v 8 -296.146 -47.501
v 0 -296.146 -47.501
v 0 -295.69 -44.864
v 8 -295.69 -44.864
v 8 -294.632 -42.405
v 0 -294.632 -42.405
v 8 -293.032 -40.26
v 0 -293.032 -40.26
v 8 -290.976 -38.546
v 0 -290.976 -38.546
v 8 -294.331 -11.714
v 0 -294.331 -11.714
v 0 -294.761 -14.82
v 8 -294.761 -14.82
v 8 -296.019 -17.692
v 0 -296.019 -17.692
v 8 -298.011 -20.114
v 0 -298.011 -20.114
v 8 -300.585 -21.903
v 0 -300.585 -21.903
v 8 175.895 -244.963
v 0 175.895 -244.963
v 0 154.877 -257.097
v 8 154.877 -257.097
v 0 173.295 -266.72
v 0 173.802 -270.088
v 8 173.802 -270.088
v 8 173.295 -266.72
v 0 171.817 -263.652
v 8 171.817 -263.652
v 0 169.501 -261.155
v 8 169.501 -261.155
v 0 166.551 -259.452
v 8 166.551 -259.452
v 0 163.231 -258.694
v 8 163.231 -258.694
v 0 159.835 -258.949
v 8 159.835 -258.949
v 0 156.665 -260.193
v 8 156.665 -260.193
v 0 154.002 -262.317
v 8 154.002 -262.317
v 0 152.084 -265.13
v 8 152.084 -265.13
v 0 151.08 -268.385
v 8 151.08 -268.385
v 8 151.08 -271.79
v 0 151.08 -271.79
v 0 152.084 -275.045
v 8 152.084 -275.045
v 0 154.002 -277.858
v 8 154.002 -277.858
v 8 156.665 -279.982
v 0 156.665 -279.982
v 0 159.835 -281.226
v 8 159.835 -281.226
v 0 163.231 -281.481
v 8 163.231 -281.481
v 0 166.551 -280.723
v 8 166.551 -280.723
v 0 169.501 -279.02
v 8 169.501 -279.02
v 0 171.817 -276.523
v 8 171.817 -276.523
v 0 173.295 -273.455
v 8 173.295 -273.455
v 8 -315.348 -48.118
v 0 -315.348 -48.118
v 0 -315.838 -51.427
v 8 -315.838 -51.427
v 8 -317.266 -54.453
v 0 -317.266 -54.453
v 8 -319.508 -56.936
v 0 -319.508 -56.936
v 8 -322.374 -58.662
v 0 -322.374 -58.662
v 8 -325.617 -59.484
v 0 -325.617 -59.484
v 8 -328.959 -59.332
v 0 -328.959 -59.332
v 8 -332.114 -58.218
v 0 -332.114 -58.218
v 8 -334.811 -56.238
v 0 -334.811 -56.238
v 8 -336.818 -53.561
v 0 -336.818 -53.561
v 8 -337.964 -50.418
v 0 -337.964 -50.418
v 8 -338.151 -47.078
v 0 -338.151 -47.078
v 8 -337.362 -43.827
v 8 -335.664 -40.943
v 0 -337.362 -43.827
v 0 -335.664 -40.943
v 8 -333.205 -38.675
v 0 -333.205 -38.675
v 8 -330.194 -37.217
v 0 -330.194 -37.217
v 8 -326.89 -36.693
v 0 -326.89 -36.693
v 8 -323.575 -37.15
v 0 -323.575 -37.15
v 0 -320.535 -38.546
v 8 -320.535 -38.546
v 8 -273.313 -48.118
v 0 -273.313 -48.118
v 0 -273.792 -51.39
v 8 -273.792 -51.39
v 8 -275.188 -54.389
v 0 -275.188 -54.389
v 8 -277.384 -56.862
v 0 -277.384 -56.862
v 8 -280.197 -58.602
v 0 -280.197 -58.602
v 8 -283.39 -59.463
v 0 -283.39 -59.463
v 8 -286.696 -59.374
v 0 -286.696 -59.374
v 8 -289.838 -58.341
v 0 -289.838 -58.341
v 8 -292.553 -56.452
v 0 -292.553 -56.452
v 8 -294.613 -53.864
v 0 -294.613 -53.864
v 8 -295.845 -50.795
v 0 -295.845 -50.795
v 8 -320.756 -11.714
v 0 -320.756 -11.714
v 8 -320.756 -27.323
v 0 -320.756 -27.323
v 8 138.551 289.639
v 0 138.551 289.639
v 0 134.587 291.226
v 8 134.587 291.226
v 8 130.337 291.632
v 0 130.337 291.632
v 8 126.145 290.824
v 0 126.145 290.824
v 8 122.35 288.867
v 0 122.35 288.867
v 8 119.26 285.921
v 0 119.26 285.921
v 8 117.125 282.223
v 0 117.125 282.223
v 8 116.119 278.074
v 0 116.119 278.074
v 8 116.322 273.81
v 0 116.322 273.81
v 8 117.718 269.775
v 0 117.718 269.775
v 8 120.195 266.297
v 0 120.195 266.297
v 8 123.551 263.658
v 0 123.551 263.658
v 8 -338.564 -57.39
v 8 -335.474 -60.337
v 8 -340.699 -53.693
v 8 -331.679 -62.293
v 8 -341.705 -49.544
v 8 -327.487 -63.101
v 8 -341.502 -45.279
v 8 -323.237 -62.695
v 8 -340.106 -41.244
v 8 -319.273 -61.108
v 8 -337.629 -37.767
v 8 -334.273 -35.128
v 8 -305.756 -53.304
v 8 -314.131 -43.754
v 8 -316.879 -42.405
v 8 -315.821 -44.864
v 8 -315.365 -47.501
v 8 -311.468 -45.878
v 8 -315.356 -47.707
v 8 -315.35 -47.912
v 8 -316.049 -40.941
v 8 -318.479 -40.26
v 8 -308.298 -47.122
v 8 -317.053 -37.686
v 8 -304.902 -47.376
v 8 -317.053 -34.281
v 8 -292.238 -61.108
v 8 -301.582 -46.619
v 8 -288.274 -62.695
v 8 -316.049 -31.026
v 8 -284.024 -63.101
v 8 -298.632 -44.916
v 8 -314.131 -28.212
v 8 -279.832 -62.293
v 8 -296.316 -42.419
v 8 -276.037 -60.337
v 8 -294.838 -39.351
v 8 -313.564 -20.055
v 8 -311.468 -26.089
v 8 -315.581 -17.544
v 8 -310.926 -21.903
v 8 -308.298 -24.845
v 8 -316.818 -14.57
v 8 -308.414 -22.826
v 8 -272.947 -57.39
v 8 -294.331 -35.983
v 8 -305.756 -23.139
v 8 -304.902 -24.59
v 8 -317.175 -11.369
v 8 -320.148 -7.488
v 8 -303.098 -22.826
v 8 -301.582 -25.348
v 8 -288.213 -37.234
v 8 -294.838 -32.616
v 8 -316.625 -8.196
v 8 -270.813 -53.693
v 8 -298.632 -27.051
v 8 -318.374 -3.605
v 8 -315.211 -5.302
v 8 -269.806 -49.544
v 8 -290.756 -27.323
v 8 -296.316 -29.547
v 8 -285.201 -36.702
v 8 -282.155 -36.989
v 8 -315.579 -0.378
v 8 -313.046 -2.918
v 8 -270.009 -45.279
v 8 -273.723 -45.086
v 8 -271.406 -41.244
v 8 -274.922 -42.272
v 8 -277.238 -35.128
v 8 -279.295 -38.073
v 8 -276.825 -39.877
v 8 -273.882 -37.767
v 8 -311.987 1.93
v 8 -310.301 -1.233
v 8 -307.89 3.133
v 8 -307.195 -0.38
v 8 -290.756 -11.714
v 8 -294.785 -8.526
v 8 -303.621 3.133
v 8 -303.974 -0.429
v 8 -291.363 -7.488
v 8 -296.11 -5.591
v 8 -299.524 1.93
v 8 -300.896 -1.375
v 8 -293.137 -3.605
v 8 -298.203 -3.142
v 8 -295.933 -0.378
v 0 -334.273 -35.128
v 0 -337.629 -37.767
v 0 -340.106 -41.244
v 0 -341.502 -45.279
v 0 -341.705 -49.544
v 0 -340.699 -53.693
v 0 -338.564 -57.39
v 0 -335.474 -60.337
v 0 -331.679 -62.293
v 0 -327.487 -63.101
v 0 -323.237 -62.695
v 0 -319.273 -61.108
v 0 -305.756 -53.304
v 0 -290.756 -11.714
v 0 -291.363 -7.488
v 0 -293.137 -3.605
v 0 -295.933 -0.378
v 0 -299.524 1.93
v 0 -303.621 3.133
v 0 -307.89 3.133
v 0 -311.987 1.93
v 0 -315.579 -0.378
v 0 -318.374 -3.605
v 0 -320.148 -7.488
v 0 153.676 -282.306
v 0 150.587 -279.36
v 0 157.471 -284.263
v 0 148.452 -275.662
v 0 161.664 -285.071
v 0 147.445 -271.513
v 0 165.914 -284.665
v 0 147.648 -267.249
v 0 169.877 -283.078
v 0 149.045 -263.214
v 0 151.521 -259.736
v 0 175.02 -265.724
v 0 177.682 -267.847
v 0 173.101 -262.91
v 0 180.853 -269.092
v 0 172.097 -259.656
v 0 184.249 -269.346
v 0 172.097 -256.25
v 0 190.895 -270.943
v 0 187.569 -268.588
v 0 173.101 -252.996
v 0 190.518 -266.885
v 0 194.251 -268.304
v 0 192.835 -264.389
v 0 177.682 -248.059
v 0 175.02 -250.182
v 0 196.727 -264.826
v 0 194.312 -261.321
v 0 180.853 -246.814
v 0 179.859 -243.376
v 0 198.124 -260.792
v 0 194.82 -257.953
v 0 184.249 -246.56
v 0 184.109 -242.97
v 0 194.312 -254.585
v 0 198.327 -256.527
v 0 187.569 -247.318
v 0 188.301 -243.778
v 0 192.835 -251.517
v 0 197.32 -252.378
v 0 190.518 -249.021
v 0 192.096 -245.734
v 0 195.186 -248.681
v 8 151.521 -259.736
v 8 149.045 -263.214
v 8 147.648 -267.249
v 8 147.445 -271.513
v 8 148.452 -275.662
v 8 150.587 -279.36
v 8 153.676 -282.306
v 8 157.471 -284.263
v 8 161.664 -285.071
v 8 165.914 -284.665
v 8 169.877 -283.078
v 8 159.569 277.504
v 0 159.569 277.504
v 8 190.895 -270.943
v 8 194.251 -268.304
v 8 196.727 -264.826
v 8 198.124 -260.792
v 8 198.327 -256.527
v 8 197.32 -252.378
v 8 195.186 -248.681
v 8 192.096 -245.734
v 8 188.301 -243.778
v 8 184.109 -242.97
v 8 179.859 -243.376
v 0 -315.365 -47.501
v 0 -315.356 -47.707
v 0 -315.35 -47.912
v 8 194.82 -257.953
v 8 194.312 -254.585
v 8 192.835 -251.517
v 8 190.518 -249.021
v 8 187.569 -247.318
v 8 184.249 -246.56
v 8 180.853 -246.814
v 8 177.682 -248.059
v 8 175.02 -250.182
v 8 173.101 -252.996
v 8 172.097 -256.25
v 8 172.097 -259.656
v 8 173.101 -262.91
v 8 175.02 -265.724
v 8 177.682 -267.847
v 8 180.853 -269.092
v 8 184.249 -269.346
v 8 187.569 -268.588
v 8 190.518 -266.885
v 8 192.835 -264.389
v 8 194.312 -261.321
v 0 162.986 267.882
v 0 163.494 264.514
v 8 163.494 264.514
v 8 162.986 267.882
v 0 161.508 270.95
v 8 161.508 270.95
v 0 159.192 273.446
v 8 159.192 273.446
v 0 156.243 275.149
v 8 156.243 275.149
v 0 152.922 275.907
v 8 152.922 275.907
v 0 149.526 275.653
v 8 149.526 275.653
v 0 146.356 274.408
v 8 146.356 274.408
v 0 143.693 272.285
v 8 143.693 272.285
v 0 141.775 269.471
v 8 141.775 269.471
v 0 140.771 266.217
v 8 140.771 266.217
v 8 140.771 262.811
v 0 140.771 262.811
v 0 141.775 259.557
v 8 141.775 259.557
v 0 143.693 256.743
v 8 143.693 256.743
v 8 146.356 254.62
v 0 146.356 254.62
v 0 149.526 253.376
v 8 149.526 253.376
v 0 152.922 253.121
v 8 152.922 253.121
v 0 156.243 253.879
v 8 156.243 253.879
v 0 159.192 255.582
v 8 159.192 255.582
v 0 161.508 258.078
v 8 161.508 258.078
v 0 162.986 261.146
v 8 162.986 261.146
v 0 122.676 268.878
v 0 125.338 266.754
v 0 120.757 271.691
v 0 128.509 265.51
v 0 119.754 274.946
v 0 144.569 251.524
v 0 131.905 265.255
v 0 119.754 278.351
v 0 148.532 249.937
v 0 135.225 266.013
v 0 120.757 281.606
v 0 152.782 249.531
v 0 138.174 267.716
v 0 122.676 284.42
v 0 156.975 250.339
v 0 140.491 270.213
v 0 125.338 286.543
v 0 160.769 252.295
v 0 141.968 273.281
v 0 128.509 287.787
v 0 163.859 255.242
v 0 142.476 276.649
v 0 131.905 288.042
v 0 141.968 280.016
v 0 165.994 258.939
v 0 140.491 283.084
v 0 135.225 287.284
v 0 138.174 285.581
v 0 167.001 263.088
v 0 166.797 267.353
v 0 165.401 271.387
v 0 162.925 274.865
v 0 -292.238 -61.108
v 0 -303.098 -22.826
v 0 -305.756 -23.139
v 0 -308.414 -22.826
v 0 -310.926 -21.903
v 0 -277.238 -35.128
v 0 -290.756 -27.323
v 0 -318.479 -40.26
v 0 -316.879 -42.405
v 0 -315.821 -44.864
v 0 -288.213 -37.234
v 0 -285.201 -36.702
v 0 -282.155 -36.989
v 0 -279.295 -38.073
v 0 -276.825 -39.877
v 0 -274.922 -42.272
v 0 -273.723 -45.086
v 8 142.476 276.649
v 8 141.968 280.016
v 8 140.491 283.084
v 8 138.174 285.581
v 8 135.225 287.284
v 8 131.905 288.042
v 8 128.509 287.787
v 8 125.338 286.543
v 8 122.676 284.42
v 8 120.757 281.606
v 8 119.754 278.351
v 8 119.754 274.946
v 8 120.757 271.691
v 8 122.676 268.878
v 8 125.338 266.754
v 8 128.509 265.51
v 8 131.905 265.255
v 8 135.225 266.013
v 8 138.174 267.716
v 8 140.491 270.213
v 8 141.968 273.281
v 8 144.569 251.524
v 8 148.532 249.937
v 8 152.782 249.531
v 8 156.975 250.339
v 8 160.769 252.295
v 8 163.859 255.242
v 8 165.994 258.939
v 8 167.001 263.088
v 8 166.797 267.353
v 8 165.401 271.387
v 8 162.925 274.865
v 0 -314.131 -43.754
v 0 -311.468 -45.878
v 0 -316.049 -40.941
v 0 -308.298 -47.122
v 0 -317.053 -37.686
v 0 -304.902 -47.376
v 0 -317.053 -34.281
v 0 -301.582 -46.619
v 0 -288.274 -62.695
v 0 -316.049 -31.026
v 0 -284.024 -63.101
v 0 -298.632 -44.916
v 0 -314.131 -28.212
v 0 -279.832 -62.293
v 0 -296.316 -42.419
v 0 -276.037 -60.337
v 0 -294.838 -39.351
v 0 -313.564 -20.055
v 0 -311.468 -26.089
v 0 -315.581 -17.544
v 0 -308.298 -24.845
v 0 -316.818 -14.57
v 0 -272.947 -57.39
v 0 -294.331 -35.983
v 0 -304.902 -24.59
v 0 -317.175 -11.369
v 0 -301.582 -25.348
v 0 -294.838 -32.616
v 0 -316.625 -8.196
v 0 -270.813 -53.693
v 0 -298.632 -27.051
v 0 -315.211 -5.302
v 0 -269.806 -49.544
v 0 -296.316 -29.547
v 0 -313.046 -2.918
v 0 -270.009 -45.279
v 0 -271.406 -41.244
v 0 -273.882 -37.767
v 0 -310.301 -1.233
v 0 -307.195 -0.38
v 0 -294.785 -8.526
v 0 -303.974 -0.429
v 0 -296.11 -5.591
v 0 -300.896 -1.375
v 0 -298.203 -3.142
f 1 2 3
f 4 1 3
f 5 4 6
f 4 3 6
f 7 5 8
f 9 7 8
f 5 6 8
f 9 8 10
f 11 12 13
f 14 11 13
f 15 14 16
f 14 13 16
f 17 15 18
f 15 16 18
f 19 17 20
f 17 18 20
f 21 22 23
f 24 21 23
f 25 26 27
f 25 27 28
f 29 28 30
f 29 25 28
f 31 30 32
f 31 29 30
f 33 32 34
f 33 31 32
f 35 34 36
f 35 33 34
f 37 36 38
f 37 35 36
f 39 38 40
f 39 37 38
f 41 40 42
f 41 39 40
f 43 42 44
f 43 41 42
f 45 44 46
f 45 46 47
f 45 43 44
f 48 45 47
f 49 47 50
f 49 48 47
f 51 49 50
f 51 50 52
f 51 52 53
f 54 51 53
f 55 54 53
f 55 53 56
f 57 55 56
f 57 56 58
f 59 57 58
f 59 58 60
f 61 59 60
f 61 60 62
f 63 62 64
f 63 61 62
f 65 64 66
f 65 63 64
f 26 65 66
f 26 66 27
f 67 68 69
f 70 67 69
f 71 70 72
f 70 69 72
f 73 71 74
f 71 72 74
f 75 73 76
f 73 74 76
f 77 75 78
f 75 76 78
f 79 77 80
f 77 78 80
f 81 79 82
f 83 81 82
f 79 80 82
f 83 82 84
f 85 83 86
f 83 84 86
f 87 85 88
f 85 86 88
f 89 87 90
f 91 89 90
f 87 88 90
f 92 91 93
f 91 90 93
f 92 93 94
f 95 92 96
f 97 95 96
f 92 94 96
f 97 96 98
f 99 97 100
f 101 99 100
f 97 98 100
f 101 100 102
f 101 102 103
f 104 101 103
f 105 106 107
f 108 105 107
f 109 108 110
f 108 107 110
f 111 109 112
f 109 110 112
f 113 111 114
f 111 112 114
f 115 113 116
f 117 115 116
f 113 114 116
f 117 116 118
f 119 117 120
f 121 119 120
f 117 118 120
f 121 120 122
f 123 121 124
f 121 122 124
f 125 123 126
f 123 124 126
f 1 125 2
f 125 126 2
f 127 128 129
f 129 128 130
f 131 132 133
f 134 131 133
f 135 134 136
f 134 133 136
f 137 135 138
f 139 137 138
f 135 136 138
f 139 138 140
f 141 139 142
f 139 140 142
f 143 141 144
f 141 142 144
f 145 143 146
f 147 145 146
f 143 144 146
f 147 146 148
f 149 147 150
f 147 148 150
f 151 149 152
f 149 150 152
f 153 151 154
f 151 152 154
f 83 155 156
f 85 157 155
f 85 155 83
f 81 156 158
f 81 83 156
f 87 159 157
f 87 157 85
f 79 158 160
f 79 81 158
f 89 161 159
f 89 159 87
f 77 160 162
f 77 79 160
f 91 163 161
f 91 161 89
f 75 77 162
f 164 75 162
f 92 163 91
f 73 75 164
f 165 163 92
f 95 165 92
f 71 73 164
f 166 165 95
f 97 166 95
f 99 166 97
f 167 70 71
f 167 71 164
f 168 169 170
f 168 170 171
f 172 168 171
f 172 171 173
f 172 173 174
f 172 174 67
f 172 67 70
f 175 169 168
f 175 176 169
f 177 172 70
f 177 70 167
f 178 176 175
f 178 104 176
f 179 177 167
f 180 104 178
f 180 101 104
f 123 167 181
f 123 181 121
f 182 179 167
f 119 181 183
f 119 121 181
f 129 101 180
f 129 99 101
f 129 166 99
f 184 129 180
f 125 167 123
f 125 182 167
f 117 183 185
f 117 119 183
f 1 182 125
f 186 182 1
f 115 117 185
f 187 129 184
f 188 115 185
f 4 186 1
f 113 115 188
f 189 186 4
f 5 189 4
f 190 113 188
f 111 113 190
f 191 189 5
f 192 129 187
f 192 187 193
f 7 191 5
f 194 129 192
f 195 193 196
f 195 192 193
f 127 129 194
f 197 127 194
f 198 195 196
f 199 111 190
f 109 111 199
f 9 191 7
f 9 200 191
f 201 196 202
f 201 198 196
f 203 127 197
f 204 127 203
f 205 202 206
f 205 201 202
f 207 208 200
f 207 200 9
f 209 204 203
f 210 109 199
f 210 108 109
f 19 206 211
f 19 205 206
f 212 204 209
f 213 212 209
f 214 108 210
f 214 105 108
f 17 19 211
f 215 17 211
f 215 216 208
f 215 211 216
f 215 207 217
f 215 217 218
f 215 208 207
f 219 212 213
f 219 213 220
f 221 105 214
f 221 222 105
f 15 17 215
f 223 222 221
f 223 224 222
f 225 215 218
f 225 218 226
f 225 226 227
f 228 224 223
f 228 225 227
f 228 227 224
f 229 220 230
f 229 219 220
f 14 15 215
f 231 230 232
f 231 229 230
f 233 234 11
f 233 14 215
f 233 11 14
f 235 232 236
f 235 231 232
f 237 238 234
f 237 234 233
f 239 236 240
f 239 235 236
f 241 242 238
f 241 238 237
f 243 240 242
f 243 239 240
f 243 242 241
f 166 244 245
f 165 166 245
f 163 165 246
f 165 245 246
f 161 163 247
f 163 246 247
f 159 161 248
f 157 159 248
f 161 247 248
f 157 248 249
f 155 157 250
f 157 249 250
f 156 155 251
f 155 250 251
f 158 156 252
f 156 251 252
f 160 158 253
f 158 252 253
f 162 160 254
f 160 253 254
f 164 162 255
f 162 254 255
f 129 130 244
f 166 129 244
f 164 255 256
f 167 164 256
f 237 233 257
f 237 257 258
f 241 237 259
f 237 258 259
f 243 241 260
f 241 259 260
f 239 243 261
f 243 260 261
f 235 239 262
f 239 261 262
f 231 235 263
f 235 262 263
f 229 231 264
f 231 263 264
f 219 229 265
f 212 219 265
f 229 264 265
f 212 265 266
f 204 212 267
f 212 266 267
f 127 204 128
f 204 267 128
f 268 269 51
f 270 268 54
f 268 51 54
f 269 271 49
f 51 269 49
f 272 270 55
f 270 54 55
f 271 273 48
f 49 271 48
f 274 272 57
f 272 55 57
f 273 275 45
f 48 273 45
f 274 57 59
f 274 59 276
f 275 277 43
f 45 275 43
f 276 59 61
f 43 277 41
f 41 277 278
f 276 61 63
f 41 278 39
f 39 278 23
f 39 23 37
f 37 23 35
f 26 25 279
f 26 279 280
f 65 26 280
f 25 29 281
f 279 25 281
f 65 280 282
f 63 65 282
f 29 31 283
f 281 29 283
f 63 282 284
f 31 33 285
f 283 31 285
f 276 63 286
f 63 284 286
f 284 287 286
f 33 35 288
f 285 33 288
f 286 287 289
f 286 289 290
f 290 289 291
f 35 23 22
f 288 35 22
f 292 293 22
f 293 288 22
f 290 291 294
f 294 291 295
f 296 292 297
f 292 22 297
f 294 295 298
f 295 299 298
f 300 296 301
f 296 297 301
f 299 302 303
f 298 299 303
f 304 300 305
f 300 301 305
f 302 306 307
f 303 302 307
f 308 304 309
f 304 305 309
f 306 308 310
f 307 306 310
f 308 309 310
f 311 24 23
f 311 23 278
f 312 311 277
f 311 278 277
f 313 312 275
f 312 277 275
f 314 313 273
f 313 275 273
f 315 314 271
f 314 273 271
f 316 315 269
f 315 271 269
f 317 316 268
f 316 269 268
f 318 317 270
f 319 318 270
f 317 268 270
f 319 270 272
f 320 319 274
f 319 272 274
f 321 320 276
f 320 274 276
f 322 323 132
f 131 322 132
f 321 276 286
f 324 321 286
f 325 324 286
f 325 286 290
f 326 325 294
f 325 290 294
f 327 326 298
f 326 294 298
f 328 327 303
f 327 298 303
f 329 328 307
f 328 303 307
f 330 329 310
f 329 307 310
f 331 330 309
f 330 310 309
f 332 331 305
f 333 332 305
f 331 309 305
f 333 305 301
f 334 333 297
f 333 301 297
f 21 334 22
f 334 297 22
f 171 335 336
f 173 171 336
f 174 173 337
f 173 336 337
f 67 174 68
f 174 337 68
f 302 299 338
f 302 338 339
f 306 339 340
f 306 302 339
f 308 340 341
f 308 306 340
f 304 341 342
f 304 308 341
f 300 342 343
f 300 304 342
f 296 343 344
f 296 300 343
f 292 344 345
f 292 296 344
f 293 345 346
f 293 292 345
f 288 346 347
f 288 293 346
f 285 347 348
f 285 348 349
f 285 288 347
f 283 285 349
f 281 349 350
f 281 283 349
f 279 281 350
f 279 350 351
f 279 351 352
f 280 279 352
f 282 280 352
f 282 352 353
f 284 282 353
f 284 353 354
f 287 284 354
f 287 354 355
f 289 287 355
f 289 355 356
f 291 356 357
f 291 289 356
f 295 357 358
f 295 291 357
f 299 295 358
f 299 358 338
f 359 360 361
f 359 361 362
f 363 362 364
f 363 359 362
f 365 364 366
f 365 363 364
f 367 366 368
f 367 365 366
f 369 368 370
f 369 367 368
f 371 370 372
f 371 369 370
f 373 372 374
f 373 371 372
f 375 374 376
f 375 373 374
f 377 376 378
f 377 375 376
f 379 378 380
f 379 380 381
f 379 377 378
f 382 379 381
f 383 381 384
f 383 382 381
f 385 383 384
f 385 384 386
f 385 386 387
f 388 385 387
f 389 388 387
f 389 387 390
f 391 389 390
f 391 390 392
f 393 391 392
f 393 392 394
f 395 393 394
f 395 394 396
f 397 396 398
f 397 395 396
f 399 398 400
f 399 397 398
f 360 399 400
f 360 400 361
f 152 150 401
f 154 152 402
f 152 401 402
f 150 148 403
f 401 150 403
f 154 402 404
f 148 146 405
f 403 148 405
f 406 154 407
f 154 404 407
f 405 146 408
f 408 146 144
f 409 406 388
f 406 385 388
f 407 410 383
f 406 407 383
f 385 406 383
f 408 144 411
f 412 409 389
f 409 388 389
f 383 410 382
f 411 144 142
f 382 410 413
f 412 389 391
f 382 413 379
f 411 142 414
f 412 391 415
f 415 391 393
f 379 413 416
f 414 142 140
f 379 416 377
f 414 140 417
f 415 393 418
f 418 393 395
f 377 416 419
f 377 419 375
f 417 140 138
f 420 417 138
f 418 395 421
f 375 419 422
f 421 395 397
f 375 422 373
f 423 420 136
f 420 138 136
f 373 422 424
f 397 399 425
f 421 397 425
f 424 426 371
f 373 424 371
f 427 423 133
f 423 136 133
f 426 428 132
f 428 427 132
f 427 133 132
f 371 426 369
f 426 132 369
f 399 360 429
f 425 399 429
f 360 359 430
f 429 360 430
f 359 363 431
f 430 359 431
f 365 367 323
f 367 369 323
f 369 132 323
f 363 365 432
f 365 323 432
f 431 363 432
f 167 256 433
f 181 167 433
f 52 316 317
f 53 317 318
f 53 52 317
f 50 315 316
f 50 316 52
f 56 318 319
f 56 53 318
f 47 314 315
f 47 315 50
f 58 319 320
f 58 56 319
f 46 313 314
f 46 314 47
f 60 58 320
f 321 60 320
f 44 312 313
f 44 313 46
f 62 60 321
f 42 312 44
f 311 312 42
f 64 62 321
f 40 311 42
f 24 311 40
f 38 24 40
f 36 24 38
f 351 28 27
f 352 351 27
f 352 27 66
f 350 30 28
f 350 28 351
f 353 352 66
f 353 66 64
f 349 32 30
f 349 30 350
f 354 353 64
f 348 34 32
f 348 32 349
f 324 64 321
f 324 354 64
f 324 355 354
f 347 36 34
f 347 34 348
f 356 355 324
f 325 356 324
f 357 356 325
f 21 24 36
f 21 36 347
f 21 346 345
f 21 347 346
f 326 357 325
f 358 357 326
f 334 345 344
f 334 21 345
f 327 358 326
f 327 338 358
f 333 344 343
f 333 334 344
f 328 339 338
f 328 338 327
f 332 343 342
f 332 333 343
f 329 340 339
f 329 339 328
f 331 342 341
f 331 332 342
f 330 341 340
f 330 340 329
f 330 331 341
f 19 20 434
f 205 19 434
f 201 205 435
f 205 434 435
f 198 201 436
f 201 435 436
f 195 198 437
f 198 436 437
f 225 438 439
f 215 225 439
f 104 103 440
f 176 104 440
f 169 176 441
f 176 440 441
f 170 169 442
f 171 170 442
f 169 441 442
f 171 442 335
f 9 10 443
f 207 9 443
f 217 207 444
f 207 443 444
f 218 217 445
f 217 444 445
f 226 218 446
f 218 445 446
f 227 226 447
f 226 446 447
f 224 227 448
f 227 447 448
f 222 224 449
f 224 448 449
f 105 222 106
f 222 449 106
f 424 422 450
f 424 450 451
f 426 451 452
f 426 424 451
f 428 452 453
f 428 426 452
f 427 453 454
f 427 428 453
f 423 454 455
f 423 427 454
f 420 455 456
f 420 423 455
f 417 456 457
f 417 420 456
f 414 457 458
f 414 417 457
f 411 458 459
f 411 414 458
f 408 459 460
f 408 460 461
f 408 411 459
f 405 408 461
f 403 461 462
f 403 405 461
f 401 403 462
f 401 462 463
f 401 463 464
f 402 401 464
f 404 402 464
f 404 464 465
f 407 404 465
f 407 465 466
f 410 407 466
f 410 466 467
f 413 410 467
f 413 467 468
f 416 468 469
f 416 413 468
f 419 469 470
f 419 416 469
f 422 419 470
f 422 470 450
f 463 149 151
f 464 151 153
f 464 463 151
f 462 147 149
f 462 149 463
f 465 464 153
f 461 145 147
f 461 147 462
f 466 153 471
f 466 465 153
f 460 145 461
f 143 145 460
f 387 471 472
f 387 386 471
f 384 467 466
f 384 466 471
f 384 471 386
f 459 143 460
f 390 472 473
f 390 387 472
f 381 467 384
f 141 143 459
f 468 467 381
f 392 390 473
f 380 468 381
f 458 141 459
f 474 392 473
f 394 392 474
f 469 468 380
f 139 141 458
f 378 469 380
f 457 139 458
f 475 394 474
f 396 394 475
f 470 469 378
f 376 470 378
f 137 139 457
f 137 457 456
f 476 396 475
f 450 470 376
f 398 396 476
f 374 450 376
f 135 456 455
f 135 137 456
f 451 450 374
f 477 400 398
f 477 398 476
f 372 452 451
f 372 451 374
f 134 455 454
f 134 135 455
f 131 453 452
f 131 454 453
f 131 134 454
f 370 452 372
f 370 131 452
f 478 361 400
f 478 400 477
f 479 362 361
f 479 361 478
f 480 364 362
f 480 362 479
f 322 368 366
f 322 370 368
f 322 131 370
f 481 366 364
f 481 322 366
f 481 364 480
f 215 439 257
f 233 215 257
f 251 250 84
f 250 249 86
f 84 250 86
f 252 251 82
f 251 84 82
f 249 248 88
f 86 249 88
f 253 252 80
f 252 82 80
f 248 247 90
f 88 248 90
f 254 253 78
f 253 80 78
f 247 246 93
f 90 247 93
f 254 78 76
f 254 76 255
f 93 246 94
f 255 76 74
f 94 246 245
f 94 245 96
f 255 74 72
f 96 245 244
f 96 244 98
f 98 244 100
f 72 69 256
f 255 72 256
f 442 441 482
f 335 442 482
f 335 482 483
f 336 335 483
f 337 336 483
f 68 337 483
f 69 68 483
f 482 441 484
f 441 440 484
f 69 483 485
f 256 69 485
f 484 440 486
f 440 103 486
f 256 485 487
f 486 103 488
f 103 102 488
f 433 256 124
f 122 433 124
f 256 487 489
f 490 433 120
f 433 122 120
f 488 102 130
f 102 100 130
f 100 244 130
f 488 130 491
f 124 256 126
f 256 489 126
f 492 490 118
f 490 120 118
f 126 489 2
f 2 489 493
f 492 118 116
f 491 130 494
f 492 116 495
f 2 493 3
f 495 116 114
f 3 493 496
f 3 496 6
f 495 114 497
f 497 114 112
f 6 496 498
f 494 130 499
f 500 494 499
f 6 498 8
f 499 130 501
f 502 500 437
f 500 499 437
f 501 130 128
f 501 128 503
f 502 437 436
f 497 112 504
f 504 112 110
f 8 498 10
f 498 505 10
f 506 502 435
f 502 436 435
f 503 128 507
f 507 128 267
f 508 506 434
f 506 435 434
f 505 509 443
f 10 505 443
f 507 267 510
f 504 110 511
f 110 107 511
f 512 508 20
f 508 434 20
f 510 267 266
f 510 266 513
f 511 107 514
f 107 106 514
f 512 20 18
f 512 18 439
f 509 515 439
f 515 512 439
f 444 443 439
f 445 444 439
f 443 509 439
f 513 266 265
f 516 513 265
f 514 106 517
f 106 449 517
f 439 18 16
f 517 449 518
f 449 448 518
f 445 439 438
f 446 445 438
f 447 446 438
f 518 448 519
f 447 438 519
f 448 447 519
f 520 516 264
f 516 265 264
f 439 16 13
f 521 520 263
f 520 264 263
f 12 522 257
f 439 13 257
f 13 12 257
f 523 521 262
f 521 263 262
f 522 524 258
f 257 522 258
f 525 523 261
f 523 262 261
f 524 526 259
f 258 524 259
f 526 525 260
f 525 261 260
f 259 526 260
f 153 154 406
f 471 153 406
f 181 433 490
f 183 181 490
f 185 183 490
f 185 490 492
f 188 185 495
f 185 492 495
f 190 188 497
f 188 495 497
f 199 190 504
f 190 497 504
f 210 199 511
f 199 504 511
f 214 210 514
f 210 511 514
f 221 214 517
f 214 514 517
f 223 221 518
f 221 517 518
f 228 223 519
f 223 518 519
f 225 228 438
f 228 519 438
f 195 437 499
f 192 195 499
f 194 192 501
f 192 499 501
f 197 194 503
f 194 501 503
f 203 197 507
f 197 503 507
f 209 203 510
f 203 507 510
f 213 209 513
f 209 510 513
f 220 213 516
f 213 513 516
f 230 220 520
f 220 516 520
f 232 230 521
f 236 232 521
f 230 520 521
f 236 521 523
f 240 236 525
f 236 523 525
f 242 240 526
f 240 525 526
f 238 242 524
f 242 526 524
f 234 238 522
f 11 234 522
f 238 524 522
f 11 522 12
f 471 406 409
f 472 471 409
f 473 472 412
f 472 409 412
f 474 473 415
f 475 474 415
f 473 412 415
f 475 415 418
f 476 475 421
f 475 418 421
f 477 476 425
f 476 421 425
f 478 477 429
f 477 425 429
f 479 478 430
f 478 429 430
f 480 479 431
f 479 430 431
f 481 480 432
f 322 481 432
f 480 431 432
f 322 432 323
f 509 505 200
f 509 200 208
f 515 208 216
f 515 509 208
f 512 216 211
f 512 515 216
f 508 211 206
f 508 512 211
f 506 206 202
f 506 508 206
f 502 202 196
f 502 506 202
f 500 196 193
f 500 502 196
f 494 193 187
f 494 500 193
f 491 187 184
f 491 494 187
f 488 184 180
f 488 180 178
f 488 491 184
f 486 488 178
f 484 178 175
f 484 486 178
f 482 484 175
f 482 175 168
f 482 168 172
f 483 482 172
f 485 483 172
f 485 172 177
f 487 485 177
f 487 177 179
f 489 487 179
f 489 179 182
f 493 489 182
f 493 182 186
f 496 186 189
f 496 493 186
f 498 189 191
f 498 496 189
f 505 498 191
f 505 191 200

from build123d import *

# Parameters (mm, degrees)
F0_R     = 11.425
F1_DEPTH = 8


with BuildPart() as f1:
    # F0 (on Right) → F1 (new body)
    with BuildSketch(Plane.YZ):
        with BuildLine():
            ThreePointArc((-310.9258660243, -21.9026233512), (-311.7330942065, -1.9778892959), (-294.3306152344, -11.7144374592))
            ThreePointArc((-294.3306152344, -11.7144374592), (-296.019067071, -17.6919164314), (-300.5853644445, -21.9026233512))
            ThreePointArc((-300.5853644445, -21.9026233512), (-299.3970730296, -22.3977931463), (-298.2556152344, -22.9930273141))
            Line((-298.2556152344, -22.9930273141), (-290.7556152344, -27.323154333))
            Line((-290.7556152344, -27.323154333), (-290.7556152344, -11.7144374592))
            ThreePointArc((-290.7556152344, -11.7144374592), (-305.7556152344, 3.2855625408), (-320.7556152344, -11.7144374592))
            Line((-320.7556152344, -11.7144374592), (-320.7556152344, -27.323154333))
            Line((-320.7556152344, -27.323154333), (-313.2556152344, -22.9930273141))
            ThreePointArc((-313.2556152344, -22.9930273141), (-312.1141574392, -22.3977931463), (-310.9258660243, -21.9026233512))
        make_face()
        with BuildLine():
            ThreePointArc((-320.7556152344, -35.9834083708), (-318.7459962911, -28.4834083708), (-313.2556152344, -22.9930273141))
            Line((-313.2556152344, -22.9930273141), (-320.7556152344, -27.323154333))
            Line((-320.7556152344, -27.323154333), (-320.7556152344, -35.9834083708))
        make_face()
        with BuildLine():
            Line((-290.7556152344, -27.323154333), (-298.2556152344, -22.9930273141))
            ThreePointArc((-298.2556152344, -22.9930273141), (-292.7652341776, -28.4834083708), (-290.7556152344, -35.9834083708))
            Line((-290.7556152344, -35.9834083708), (-290.7556152344, -27.323154333))
        make_face()
        with BuildLine():
            Line((-320.7556152344, -35.9834083708), (-320.7556152344, -27.323154333))
            Line((-320.7556152344, -27.323154333), (-334.2731605676, -35.1275127699))
            ThreePointArc((-334.2731605676, -35.1275127699), (-339.7635416243, -55.6178938267), (-319.2731605676, -61.1082748834))
            Line((-319.2731605676, -61.1082748834), (-305.7556152344, -53.3039164465))
            Line((-305.7556152344, -53.3039164465), (-313.2556152344, -48.9737894276))
            ThreePointArc((-313.2556152344, -48.9737894276), (-314.3418320425, -48.2828750635), (-315.3648073717, -47.5013694086))
            ThreePointArc((-315.3648073717, -47.5013694086), (-315.3523230268, -47.8095192678), (-315.3481605676, -48.1178938267))
            ThreePointArc((-315.3481605676, -48.1178938267), (-336.8180832897, -53.5612523952), (-320.5350581616, -38.5462323527))
            ThreePointArc((-320.5350581616, -38.5462323527), (-320.7003742473, -37.2695569027), (-320.7556152344, -35.9834083708))
        make_face()
        with BuildLine():
            Line((-290.7556152344, -27.323154333), (-290.7556152344, -35.9834083708))
            ThreePointArc((-290.7556152344, -35.9834083708), (-290.8108562215, -37.2695569027), (-290.9761723072, -38.5462323527))
            ThreePointArc((-290.9761723072, -38.5462323527), (-279.2947113326, -38.0729711045), (-273.3130699012, -48.1178938267))
            ThreePointArc((-273.3130699012, -48.1178938267), (-285.04644446, -59.5387313674), (-296.1464230971, -47.5013694086))
            ThreePointArc((-296.1464230971, -47.5013694086), (-297.1693984263, -48.2828750635), (-298.2556152344, -48.9737894276))
            Line((-298.2556152344, -48.9737894276), (-305.7556152344, -53.3039164465))
            Line((-305.7556152344, -53.3039164465), (-292.2380699012, -61.1082748834))
            ThreePointArc((-292.2380699012, -61.1082748834), (-271.7476888444, -55.6178938267), (-277.2380699012, -35.1275127699))
            Line((-277.2380699012, -35.1275127699), (-290.7556152344, -27.323154333))
        make_face()
        with BuildLine():
            Line((-313.2556152344, -48.9737894276), (-305.7556152344, -53.3039164465))
            Line((-305.7556152344, -53.3039164465), (-298.2556152344, -48.9737894276))
            ThreePointArc((-298.2556152344, -48.9737894276), (-305.7556152344, -50.9834083708), (-313.2556152344, -48.9737894276))
        make_face()
        with BuildLine():
            ThreePointArc((-300.5853644445, -21.9026233512), (-305.7556152344, -23.1394374592), (-310.9258660243, -21.9026233512))
            ThreePointArc((-310.9258660243, -21.9026233512), (-312.1141574392, -22.3977931463), (-313.2556152344, -22.9930273141))
            ThreePointArc((-313.2556152344, -22.9930273141), (-318.7459962911, -28.4834083708), (-320.7556152344, -35.9834083708))
            ThreePointArc((-320.7556152344, -35.9834083708), (-320.7003742473, -37.2695569027), (-320.5350581616, -38.5462323527))
            ThreePointArc((-320.5350581616, -38.5462323527), (-316.8788203293, -42.4053938267), (-315.3648073717, -47.5013694086))
            ThreePointArc((-315.3648073717, -47.5013694086), (-314.3418320425, -48.2828750635), (-313.2556152344, -48.9737894276))
            ThreePointArc((-313.2556152344, -48.9737894276), (-305.7556152344, -50.9834083708), (-298.2556152344, -48.9737894276))
            ThreePointArc((-298.2556152344, -48.9737894276), (-297.1693984263, -48.2828750635), (-296.1464230971, -47.5013694086))
            ThreePointArc((-296.1464230971, -47.5013694086), (-294.6324101394, -42.4053938267), (-290.9761723072, -38.5462323527))
            ThreePointArc((-290.9761723072, -38.5462323527), (-290.8108562215, -37.2695569027), (-290.7556152344, -35.9834083708))
            ThreePointArc((-290.7556152344, -35.9834083708), (-292.7652341776, -28.4834083708), (-298.2556152344, -22.9930273141))
            ThreePointArc((-298.2556152344, -22.9930273141), (-299.3970730296, -22.3977931463), (-300.5853644445, -21.9026233512))
        make_face()
        with Locations((-305.7556152344, -35.9834083708)):
            Circle(F0_R, mode=Mode.SUBTRACT)
    extrude(amount=F1_DEPTH)


with BuildPart() as f1b:
    # F0 (on Right) → F1, piece 2 (new body)
    with BuildSketch(Plane.YZ):
        with BuildLine():
            ThreePointArc((154.8773395229, -257.0971257854), (149.3869584661, -277.5875068422), (169.8773395229, -283.077887899))
            Line((169.8773395229, -283.077887899), (190.8948848561, -270.9434024432))
            ThreePointArc((190.8948848561, -270.9434024432), (196.3852659129, -250.4530213864), (175.8948848561, -244.9626403296))
            Line((175.8948848561, -244.9626403296), (154.8773395229, -257.0971257854))
        make_face()
        with Locations((162.3773395229, -270.0875068422)):
            Circle(F0_R, mode=Mode.SUBTRACT)
        with Locations((183.3948848561, -257.9530213864)):
            Circle(F0_R, mode=Mode.SUBTRACT)
    extrude(amount=F1_DEPTH)


with BuildPart() as f1c:
    # F0 (on Right) → F1, piece 3 (new body)
    with BuildSketch(Plane.YZ):
        with BuildLine():
            ThreePointArc((144.5685038837, 251.523677961), (165.0588849405, 257.0140590178), (159.5685038837, 277.5044400745))
            Line((159.5685038837, 277.5044400745), (138.5509585505, 289.6389255303))
            ThreePointArc((138.5509585505, 289.6389255303), (118.0605774938, 284.1485444736), (123.5509585505, 263.6581634168))
            Line((123.5509585505, 263.6581634168), (144.5685038837, 251.523677961))
        make_face()
        with Locations((152.0685038837, 264.5140590178)):
            Circle(F0_R, mode=Mode.SUBTRACT)
        with Locations((131.0509585505, 276.6485444736)):
            Circle(F0_R, mode=Mode.SUBTRACT)
    extrude(amount=F1_DEPTH)


solid = Compound([f1.part, f1b.part, f1c.part])
